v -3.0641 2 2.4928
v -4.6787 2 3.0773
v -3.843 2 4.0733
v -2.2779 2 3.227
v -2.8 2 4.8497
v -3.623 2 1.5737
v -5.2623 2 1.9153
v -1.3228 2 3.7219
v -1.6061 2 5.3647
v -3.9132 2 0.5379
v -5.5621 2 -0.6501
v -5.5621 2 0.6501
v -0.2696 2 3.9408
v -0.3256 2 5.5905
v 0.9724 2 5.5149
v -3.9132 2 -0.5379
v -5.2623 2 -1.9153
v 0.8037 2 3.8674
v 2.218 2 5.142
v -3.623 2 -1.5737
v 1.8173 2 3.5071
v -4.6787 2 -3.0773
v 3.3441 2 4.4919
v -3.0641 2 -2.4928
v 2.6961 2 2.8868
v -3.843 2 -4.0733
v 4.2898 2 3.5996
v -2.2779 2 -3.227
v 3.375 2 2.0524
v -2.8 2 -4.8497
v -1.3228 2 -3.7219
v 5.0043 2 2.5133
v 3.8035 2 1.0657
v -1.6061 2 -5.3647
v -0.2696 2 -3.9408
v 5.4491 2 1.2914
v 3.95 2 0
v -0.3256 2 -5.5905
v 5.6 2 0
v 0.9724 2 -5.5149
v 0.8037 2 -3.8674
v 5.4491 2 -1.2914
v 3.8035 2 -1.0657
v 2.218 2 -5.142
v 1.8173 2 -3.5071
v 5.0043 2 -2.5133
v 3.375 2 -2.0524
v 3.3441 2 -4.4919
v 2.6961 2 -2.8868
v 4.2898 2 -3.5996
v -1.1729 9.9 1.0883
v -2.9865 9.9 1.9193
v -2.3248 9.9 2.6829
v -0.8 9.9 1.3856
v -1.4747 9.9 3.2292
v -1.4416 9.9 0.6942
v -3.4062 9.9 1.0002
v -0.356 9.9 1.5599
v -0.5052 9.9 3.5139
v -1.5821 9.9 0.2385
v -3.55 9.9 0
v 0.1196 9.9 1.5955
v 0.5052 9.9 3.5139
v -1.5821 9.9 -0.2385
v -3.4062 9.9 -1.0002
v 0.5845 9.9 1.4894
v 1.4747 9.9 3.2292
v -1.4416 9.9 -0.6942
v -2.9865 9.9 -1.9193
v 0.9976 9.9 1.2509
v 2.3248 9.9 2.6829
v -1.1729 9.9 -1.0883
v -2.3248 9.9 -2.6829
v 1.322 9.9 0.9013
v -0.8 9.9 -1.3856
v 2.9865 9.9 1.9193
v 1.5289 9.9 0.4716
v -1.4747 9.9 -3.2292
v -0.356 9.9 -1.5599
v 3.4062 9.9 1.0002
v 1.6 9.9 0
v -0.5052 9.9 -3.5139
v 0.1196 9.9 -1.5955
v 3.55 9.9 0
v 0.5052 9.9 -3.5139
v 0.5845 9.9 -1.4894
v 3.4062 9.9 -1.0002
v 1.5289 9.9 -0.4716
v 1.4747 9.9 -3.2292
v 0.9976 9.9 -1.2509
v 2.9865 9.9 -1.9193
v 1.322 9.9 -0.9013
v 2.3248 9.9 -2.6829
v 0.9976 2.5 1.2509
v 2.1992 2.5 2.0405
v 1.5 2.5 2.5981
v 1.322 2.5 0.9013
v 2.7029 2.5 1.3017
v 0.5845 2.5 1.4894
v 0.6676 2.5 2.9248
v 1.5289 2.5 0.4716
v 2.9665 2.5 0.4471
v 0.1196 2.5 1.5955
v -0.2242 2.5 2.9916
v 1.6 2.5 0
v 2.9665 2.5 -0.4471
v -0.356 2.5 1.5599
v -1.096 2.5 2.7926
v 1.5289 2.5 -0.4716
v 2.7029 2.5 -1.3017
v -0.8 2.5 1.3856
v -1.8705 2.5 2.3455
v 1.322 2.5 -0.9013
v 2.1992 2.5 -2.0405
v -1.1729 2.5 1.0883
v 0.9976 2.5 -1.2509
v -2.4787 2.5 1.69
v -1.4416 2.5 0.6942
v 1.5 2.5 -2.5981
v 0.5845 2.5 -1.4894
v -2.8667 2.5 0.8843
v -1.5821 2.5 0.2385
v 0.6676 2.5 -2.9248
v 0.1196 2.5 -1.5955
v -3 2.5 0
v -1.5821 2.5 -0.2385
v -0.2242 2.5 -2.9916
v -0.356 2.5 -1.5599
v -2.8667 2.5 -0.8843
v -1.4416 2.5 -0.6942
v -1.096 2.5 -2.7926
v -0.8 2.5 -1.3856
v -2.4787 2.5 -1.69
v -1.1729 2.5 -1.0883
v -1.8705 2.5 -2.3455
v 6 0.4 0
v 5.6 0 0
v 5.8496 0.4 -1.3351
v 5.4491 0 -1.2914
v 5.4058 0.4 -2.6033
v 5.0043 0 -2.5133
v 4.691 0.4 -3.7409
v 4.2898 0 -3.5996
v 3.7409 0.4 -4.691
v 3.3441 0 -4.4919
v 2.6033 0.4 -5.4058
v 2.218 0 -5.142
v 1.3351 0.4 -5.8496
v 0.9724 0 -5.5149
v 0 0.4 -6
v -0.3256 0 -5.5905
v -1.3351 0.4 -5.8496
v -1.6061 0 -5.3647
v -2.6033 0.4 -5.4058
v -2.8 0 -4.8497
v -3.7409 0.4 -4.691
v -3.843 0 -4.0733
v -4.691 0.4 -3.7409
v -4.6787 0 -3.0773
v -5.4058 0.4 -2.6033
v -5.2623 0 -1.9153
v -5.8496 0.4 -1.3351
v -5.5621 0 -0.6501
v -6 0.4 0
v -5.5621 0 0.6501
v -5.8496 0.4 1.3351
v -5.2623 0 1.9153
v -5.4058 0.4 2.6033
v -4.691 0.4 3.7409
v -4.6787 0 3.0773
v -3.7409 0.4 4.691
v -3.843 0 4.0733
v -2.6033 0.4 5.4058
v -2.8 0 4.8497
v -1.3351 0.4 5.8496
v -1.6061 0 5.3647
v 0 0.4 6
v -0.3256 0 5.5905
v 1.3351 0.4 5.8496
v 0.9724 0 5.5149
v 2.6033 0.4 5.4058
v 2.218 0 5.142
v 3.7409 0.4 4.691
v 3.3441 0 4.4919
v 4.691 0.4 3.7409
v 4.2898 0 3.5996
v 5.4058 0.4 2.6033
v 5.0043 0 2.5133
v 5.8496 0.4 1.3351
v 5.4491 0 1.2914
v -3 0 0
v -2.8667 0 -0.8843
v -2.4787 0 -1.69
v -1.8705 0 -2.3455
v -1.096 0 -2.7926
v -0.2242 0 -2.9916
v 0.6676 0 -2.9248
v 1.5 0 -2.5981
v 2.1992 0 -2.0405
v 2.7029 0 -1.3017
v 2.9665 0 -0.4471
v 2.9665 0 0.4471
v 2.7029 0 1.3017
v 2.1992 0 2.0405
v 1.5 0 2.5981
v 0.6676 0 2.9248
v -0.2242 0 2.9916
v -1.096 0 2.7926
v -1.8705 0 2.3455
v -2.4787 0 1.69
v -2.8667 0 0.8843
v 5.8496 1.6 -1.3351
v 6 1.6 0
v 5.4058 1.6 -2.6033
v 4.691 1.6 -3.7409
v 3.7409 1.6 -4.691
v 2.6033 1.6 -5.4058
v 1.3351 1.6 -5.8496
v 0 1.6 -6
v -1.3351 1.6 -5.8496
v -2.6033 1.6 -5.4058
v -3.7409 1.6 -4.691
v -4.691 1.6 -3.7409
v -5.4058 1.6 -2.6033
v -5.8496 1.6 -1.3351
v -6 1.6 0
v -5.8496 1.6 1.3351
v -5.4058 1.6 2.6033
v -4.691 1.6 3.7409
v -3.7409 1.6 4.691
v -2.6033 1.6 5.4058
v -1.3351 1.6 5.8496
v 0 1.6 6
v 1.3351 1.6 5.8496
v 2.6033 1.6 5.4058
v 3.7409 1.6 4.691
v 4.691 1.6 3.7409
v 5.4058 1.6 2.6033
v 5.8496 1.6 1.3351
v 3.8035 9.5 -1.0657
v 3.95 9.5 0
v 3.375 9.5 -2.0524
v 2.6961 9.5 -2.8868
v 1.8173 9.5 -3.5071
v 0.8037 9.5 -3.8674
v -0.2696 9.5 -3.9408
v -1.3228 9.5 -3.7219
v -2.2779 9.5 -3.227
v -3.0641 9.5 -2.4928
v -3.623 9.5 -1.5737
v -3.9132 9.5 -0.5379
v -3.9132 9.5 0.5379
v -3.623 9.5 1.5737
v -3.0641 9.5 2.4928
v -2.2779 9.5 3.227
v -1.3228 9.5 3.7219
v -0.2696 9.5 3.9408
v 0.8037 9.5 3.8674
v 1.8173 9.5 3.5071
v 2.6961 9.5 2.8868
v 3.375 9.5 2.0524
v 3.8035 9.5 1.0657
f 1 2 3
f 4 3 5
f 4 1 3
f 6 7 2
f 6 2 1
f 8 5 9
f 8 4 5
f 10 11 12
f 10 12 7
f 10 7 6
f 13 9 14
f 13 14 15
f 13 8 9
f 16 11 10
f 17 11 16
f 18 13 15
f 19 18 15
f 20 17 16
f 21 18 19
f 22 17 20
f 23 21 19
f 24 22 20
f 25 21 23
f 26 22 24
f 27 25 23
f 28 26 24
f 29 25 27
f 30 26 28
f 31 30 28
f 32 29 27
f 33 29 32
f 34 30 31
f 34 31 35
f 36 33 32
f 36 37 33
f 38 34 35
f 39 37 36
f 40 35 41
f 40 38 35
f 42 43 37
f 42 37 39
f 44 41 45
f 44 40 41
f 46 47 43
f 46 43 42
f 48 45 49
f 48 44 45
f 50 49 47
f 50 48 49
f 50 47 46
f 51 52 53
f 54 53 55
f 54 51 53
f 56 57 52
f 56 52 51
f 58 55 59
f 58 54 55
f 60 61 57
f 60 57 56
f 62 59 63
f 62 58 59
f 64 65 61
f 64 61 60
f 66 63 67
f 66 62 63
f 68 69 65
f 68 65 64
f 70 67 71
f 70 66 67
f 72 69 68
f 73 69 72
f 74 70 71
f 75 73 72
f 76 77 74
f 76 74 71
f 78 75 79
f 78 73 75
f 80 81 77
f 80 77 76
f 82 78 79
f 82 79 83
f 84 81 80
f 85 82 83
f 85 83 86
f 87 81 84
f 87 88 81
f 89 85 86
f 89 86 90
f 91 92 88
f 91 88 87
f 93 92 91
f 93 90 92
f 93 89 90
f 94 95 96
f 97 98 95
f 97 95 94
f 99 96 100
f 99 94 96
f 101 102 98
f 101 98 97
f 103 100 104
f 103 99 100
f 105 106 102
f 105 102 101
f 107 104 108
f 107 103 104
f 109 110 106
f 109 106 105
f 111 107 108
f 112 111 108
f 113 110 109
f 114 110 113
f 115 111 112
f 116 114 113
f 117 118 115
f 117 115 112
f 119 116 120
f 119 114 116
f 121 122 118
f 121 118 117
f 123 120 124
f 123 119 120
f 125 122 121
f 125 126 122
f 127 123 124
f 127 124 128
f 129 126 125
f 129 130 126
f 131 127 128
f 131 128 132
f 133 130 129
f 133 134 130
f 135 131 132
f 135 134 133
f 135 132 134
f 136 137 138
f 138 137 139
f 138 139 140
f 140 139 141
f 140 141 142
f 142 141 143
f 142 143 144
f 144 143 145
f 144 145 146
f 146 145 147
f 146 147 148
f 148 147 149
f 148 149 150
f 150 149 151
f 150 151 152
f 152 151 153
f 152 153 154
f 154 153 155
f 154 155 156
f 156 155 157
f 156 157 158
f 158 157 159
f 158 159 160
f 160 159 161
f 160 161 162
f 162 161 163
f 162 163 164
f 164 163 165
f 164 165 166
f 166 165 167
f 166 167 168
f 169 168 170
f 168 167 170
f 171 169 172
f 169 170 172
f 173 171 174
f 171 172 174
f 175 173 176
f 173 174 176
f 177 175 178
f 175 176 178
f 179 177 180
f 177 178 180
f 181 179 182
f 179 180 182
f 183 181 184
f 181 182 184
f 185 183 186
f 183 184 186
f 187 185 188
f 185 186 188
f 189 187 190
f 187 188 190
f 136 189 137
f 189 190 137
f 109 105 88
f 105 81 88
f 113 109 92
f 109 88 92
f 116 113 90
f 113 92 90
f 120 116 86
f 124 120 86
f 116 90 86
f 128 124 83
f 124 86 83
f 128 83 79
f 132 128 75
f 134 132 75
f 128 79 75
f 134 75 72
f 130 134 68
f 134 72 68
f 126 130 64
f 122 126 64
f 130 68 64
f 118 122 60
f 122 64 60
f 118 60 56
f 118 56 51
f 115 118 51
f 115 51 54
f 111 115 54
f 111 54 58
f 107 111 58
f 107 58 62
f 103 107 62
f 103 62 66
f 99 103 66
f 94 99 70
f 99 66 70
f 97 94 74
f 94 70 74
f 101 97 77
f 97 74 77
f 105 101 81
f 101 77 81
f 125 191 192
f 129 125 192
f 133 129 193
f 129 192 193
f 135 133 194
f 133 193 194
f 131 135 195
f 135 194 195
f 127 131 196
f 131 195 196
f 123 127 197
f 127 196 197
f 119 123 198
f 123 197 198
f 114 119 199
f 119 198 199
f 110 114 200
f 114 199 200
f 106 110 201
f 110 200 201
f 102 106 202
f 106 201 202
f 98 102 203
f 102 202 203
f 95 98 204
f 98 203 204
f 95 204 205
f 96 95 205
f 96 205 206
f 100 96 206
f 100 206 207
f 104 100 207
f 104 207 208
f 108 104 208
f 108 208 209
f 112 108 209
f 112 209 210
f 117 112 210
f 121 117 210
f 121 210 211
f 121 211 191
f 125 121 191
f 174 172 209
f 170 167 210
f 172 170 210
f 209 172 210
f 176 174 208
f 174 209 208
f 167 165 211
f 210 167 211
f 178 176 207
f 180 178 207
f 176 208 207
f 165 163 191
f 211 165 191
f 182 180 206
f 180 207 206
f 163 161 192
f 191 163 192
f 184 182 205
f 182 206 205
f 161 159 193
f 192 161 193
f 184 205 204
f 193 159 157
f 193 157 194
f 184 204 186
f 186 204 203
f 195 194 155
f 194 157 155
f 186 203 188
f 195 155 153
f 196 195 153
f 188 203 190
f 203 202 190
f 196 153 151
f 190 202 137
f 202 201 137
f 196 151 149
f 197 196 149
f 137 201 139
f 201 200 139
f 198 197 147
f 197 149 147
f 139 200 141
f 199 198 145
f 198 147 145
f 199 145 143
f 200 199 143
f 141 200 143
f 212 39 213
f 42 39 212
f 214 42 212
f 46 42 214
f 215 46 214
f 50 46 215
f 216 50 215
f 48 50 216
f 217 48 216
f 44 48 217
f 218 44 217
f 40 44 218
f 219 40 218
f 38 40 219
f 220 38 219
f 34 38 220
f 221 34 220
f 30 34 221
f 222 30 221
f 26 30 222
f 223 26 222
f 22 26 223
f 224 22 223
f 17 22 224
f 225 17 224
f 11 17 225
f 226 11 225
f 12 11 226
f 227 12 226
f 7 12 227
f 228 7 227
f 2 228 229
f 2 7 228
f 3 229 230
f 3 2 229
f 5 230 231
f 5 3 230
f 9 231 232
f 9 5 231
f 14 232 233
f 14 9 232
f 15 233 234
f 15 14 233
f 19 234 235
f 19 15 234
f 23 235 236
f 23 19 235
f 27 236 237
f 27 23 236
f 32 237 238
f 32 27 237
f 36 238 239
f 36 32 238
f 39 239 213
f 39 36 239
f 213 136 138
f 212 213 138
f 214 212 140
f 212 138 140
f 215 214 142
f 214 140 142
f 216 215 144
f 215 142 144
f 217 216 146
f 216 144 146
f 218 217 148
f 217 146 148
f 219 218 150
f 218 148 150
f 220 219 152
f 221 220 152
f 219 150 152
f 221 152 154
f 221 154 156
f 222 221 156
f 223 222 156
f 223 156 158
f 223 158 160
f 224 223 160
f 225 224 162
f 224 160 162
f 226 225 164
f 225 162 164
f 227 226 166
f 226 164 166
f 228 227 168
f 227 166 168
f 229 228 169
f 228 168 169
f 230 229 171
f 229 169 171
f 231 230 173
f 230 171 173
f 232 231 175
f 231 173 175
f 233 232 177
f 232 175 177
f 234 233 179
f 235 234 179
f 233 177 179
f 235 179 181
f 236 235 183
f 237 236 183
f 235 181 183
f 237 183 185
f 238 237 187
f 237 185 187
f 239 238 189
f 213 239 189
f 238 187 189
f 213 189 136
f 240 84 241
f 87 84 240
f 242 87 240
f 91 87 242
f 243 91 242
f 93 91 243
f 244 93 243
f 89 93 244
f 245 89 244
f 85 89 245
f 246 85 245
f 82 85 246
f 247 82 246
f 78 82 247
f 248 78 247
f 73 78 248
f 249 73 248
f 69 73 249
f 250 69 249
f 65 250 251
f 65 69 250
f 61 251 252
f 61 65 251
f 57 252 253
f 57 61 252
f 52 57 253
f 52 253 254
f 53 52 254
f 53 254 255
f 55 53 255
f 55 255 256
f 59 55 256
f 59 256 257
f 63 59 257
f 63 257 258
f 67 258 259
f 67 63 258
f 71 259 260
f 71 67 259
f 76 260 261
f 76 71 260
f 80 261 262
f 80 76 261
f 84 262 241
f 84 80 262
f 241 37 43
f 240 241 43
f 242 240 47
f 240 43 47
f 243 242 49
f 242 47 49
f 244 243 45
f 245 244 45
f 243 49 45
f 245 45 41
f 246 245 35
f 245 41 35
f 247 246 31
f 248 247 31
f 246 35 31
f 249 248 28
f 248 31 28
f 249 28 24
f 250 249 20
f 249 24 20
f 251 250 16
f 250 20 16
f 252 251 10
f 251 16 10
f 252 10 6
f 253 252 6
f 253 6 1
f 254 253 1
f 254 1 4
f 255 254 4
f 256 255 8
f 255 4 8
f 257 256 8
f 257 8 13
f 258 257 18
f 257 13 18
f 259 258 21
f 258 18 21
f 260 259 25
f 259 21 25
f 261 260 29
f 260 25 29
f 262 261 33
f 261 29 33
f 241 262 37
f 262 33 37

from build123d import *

# Parameters (mm, degrees)
SKETCH1_R                      = 6
BOSS_EXTRUDE1_DEPTH            = 2
SKETCH2_R                      = 3.95
BOSS_EXTRUDE2_DEPTH            = 7.9
CHAMFER1_SIZE                  = 0.4
CBORE_FOR_M3_SHCS1_D           = 3.2
CBORE_FOR_M3_SHCS1_CBORE_D     = 6
CBORE_FOR_M3_SHCS1_CBORE_DEPTH = 2.5


with BuildPart() as part:
    # Sketch1 → Boss-Extrude1 (new body)
    with BuildSketch(Plane(origin=(0, 0, 0), x_dir=(1, 0, 0), z_dir=(0, 1, 0))):
        Circle(SKETCH1_R)
    extrude(amount=BOSS_EXTRUDE1_DEPTH)

    # Sketch2 → Boss-Extrude2 (add)
    with BuildSketch(Plane(origin=(0, 2, 0), x_dir=(1, 0, 0), z_dir=(0, 1, 0))):
        Circle(SKETCH2_R)
    extrude(amount=BOSS_EXTRUDE2_DEPTH)

    # Chamfer1
    chamfer1_edges = [part.edges().sort_by_distance(p)[0] for p in [
        (-6, 0, 0),
        (-6, 2, 0),
        (-3.95, 9.9, 0),
    ]]
    chamfer(chamfer1_edges, length=CHAMFER1_SIZE)

    # CBORE for M3 SHCS1 (through all)
    with Locations(Plane(origin=(0, 0, 0), x_dir=(-1, 0, 0), z_dir=(0, -1, 0))):
        with Locations((0, 0)):
            CounterBoreHole(CBORE_FOR_M3_SHCS1_D / 2, CBORE_FOR_M3_SHCS1_CBORE_D / 2, CBORE_FOR_M3_SHCS1_CBORE_DEPTH)


solid = part.part
